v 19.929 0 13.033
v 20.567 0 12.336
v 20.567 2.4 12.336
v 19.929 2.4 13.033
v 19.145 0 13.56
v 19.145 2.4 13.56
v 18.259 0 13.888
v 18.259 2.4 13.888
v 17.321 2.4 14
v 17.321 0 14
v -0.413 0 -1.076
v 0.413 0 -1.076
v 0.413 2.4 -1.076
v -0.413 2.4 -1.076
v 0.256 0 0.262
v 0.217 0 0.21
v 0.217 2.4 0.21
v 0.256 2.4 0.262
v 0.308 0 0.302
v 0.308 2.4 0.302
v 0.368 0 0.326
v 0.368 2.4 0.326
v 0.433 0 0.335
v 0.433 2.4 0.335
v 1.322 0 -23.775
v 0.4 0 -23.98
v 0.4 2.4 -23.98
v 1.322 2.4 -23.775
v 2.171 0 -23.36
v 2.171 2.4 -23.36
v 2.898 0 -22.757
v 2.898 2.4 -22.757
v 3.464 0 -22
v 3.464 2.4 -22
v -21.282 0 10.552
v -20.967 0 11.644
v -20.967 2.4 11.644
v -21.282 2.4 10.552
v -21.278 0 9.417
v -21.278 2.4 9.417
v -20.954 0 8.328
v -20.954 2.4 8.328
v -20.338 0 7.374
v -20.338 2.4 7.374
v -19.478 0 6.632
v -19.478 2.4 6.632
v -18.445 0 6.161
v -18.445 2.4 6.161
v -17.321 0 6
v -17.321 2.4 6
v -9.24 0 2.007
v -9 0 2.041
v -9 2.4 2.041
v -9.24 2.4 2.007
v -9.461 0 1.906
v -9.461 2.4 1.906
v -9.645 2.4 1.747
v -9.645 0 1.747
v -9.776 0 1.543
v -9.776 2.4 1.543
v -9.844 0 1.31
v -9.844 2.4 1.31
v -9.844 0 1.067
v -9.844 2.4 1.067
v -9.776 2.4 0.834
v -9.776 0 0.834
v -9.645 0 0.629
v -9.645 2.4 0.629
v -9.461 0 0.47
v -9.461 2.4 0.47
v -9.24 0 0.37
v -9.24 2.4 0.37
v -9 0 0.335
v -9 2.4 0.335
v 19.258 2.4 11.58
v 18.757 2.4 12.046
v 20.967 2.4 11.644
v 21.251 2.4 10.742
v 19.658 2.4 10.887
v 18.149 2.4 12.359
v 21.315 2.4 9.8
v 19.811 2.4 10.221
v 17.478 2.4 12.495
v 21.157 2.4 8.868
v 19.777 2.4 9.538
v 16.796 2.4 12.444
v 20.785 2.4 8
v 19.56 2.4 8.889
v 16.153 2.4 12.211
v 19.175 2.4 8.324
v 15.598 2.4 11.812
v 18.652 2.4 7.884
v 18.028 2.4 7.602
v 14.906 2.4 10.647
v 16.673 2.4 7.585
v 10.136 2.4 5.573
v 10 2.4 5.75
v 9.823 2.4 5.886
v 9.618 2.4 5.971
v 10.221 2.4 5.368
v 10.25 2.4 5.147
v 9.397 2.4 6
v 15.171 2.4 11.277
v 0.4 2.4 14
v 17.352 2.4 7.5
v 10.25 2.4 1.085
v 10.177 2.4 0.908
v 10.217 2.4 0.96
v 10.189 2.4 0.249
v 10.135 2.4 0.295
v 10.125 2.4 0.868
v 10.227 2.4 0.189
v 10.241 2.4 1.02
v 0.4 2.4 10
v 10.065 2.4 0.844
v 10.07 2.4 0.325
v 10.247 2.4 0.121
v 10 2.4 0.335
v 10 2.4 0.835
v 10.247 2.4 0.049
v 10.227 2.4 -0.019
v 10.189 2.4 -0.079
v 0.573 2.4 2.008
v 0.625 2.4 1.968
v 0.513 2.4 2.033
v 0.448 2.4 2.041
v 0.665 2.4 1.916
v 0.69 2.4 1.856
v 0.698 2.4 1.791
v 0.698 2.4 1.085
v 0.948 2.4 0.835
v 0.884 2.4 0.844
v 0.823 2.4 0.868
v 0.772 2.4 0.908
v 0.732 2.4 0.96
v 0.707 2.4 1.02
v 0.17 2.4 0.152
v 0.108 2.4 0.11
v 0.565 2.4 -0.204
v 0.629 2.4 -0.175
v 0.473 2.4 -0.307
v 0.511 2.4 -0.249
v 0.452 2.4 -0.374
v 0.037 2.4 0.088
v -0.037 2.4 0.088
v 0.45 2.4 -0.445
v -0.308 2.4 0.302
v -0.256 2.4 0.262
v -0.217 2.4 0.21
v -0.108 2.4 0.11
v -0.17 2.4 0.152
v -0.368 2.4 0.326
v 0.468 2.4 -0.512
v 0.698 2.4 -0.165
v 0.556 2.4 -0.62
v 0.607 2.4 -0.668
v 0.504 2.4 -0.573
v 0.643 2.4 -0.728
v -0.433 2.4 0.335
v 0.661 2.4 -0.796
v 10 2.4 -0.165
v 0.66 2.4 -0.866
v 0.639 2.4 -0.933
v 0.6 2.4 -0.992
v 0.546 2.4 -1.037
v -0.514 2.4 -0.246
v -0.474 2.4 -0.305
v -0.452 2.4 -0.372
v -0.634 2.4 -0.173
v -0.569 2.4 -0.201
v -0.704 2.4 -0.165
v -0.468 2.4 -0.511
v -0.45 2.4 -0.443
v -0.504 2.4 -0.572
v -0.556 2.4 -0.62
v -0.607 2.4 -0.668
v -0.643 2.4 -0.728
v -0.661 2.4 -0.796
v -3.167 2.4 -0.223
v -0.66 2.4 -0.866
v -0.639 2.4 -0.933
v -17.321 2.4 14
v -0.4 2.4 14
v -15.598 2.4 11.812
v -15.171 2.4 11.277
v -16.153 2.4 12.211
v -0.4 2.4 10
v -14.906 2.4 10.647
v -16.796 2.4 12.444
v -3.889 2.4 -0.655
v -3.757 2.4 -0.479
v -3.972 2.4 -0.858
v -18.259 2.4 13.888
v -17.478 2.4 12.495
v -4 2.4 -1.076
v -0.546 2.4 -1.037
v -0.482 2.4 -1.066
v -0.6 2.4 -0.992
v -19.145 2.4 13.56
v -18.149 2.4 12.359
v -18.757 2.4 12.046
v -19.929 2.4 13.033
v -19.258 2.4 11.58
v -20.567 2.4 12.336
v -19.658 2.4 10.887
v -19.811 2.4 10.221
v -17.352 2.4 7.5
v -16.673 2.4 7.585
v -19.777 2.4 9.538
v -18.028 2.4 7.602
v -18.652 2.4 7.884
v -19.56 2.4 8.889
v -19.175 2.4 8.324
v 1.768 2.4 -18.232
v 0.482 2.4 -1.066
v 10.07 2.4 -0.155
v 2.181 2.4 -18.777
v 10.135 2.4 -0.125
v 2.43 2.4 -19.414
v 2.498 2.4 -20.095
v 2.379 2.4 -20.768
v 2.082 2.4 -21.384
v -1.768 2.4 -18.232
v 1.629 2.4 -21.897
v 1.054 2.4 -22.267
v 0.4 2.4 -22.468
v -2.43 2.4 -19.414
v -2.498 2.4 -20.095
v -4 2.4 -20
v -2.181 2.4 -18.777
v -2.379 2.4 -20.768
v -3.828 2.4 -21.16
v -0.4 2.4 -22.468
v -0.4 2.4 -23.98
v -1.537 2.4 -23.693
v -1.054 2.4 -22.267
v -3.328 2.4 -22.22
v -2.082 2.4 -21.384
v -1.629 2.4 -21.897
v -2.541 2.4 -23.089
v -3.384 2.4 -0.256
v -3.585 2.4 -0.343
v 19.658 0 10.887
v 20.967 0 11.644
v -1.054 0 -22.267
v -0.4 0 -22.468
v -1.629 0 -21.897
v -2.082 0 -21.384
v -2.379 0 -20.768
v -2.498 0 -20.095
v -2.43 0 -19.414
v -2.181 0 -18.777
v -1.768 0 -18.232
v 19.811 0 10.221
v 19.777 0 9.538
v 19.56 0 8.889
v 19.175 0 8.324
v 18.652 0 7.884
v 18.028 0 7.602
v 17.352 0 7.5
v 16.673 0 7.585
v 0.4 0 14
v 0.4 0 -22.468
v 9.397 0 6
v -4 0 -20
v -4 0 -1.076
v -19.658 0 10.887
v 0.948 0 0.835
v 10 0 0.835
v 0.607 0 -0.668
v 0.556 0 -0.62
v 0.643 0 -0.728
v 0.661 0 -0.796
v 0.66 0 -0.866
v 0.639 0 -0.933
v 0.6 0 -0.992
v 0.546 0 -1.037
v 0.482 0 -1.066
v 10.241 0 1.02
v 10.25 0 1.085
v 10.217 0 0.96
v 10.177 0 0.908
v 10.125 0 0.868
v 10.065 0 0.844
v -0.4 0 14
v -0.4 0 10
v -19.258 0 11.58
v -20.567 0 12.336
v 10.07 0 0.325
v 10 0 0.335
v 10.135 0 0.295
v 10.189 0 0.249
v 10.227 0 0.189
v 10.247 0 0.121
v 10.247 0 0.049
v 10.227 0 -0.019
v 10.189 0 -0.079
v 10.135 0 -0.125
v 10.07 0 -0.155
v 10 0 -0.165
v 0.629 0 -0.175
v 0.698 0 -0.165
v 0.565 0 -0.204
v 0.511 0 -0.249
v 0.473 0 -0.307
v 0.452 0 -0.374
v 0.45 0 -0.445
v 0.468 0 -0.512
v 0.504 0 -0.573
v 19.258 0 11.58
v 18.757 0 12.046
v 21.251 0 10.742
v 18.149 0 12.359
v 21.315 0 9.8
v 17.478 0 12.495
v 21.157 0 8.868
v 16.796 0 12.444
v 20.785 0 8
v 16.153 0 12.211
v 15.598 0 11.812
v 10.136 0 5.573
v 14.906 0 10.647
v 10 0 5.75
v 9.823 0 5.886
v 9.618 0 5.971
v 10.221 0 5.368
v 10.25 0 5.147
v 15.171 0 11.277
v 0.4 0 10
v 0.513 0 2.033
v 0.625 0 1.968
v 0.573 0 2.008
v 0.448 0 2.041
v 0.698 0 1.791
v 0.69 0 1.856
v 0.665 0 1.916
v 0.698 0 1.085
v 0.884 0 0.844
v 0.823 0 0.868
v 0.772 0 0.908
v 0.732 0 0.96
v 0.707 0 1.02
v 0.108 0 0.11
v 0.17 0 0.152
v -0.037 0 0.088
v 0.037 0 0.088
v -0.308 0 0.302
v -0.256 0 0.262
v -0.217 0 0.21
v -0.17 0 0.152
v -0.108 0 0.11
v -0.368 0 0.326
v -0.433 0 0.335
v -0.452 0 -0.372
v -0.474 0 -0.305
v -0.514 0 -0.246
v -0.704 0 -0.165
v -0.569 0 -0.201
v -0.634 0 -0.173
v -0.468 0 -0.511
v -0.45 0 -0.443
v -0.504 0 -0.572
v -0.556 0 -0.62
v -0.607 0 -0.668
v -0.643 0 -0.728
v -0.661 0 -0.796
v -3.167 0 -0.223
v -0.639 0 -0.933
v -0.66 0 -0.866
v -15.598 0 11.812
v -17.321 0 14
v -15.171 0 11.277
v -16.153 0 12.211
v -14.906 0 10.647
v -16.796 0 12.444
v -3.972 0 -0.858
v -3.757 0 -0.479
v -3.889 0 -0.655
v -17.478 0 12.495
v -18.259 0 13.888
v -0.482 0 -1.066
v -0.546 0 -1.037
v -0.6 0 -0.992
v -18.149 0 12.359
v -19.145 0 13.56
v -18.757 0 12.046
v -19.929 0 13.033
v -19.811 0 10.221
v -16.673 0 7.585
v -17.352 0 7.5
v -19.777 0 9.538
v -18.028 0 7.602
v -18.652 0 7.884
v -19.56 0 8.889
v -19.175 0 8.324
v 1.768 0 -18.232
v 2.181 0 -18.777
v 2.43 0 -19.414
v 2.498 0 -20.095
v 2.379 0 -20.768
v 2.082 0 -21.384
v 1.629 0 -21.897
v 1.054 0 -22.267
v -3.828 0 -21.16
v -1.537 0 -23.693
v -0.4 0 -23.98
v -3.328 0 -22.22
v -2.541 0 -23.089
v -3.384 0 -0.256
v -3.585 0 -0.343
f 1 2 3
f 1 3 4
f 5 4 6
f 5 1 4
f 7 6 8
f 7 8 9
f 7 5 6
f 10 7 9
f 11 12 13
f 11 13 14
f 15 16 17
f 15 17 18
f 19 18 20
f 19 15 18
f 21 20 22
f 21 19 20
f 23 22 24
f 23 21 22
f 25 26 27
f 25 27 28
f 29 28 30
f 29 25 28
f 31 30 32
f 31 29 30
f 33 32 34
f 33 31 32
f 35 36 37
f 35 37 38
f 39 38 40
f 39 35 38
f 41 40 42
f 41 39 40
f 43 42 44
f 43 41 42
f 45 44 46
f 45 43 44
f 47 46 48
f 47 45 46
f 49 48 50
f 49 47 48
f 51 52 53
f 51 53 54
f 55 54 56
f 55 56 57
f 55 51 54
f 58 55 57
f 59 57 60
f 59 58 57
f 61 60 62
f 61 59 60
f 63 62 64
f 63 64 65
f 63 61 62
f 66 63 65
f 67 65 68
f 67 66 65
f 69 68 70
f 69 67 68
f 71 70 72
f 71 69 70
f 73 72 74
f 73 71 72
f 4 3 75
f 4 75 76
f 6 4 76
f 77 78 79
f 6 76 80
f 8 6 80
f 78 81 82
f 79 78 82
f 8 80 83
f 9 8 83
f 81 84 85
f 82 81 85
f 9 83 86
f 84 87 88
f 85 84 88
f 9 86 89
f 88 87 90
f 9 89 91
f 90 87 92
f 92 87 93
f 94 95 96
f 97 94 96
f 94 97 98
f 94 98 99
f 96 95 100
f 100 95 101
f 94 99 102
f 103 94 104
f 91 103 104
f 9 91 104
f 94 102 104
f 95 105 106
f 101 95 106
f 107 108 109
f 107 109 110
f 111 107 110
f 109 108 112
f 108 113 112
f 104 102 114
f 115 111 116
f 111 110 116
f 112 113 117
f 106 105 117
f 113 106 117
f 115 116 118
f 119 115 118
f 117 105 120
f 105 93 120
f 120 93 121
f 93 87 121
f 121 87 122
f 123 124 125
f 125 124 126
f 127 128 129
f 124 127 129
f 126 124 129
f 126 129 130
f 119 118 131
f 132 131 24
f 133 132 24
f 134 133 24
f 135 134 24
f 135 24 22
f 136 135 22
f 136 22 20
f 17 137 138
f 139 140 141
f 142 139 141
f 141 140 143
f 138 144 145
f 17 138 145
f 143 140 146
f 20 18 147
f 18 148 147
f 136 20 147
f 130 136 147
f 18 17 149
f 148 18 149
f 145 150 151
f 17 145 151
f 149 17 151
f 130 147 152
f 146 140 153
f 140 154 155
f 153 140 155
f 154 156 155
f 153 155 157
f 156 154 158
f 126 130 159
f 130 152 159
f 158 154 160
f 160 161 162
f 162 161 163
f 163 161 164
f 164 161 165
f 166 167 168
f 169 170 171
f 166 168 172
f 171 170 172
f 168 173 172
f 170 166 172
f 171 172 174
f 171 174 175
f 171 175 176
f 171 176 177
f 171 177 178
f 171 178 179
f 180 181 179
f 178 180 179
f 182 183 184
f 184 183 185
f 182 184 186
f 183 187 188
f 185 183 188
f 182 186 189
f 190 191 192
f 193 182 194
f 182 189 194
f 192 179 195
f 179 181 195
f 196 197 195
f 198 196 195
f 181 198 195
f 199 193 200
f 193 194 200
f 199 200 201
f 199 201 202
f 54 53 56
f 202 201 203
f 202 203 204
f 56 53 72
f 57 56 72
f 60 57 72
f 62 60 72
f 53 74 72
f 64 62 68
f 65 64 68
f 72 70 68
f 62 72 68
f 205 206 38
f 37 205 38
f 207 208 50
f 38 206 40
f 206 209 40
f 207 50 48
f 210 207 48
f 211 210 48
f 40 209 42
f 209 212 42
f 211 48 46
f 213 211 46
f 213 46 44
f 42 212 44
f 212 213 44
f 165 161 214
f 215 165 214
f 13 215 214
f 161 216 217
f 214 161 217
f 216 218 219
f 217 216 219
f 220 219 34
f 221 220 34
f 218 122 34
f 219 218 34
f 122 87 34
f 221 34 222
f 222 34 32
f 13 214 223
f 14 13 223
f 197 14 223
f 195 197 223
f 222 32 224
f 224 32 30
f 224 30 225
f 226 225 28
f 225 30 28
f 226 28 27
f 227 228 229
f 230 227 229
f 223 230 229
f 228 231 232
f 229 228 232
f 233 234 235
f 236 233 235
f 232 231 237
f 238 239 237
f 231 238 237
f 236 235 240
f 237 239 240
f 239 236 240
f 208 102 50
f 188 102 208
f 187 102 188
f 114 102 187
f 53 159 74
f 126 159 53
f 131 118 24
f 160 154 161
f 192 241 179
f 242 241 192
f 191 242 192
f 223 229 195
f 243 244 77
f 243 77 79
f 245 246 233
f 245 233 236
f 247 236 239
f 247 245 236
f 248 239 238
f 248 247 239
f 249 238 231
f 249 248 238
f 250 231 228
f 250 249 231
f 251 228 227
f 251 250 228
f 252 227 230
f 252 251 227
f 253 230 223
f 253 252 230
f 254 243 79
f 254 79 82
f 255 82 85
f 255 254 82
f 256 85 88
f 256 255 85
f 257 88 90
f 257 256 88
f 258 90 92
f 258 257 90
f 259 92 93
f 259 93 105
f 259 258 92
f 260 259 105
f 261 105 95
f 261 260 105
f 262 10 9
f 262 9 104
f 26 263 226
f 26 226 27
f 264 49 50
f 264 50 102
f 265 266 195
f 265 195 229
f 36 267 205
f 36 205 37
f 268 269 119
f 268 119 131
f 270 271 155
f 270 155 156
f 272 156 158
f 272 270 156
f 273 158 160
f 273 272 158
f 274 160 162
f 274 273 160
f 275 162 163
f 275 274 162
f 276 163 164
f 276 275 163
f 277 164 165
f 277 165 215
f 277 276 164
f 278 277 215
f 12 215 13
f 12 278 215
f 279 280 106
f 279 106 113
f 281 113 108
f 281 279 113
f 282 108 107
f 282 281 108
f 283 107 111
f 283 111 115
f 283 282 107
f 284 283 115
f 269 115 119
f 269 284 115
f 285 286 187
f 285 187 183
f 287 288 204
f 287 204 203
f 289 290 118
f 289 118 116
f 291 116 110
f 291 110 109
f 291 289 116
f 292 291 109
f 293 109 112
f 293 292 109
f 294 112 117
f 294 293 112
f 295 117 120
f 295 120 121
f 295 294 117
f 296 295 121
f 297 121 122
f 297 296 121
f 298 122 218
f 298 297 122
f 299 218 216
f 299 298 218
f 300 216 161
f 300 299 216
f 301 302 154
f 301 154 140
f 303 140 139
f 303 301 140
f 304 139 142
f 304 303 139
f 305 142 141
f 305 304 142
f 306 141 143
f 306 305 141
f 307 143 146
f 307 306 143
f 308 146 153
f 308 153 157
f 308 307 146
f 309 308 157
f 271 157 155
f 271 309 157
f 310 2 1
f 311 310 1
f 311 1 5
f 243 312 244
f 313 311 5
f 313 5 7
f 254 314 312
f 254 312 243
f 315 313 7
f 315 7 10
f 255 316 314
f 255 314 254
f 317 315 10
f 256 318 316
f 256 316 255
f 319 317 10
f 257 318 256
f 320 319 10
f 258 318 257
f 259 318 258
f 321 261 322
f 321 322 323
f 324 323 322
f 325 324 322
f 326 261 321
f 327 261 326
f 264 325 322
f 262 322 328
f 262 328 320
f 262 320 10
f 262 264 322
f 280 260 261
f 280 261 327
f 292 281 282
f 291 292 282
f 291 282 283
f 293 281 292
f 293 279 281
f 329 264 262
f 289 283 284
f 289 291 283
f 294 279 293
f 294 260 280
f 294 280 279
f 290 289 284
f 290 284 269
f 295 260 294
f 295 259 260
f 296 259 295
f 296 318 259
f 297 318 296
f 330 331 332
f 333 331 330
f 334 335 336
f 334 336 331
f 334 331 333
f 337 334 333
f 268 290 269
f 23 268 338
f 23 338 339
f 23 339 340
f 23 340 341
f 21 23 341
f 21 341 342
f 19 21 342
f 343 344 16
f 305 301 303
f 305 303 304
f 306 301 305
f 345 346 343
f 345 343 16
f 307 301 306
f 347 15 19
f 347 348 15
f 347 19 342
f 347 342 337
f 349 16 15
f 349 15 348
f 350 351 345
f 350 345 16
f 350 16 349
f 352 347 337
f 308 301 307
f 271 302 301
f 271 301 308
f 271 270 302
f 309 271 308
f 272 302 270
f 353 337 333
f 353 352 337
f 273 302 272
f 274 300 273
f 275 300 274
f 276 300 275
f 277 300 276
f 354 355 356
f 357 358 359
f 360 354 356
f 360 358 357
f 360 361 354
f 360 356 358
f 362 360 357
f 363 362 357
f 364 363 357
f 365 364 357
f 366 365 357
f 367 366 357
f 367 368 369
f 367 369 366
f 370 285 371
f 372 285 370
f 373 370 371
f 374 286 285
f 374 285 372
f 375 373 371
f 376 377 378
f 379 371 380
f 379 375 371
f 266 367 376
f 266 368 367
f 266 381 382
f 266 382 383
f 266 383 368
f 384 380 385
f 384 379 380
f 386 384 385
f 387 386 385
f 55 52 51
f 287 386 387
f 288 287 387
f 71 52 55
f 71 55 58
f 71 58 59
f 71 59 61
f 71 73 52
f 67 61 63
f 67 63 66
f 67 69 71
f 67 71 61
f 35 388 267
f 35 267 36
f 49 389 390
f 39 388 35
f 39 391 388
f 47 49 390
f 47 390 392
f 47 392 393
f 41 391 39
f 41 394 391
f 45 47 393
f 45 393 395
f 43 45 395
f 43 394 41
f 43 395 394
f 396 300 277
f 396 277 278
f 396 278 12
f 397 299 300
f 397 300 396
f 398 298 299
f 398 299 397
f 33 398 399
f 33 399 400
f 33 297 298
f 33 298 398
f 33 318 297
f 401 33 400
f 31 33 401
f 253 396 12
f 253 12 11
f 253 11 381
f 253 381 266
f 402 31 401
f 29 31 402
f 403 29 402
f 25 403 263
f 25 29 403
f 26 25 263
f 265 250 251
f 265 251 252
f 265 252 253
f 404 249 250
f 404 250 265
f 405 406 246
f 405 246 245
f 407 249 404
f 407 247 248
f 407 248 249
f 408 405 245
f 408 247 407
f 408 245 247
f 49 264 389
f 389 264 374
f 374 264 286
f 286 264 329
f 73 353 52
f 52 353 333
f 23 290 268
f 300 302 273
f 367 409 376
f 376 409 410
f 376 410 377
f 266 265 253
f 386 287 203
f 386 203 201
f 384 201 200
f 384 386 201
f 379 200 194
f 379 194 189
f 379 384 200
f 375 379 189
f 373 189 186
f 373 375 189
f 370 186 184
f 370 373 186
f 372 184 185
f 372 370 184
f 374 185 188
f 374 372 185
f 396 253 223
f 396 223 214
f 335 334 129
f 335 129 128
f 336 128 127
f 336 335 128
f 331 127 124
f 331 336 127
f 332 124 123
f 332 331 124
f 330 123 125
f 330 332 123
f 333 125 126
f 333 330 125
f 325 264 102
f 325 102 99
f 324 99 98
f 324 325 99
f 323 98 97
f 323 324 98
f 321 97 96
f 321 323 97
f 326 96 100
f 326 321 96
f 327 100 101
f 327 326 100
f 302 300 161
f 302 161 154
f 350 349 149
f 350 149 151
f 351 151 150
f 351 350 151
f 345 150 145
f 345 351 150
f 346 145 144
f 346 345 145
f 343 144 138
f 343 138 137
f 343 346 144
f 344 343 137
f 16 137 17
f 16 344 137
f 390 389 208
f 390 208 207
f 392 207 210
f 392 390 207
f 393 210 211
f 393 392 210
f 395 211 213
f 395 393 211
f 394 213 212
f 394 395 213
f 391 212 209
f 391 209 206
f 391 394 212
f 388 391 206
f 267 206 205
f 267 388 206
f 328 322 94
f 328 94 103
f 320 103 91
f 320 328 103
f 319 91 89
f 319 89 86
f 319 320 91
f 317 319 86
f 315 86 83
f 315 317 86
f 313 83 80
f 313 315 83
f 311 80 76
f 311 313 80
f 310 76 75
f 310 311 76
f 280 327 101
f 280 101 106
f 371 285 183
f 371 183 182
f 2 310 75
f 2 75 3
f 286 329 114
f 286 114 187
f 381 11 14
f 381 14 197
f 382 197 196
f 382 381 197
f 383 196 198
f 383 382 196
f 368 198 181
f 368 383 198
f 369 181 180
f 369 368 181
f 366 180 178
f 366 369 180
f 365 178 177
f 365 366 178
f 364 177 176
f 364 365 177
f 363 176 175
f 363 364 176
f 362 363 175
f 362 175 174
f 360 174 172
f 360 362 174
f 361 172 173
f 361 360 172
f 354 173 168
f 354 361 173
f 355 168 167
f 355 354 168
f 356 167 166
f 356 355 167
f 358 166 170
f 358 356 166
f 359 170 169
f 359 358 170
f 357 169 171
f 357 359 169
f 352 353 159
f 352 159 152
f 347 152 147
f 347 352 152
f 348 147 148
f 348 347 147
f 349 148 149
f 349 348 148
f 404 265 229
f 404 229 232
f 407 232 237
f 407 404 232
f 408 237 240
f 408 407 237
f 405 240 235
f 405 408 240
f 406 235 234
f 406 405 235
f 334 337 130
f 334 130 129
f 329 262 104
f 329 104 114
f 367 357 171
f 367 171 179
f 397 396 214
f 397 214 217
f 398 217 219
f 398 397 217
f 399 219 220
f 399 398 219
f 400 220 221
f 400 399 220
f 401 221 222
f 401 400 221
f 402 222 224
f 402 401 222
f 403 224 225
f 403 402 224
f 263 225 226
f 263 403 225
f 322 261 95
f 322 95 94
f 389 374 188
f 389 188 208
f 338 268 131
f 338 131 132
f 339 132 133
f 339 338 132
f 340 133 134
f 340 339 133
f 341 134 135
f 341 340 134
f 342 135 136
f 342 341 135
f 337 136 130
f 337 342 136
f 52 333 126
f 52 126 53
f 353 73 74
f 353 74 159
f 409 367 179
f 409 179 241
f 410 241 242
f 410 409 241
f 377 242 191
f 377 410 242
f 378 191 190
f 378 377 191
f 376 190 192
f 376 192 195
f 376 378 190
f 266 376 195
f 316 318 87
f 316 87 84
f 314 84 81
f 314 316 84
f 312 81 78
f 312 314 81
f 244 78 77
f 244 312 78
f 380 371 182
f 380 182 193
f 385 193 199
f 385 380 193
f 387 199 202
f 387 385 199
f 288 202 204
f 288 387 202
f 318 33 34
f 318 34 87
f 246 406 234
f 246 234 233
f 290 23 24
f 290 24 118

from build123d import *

# Parameters (mm, degrees)
BOSS_EXTRUDE1_DEPTH = 2.4


with BuildPart() as part:
    # Sketch1 → Boss-Extrude1 (new body)
    with BuildSketch(Plane(origin=(0, 0, 0), x_dir=(1, 0, 0), z_dir=(0, 1, 0))):
        with BuildLine():
            Line((-1.767766953, 18.232233047), (1.767766953, 18.232233047))
            ThreePointArc((1.767766953, 18.232233047), (2.379032248, 20.768248374), (0.4, 22.467792536))
            Line((0.4, 22.467792536), (0.4, 23.979949748))
            ThreePointArc((0.4, 23.979949748), (2.170914686, 23.359632335), (3.464101615, 22))
            Line((3.464101615, 22), (20.784609691, -8))
            ThreePointArc((20.784609691, -8), (21.315492368, -9.7997489), (20.967245664, -11.643564713))
            Line((20.967245664, -11.643564713), (19.657679103, -10.887486106))
            ThreePointArc((19.657679103, -10.887486106), (19.175346808, -8.323821824), (16.673460463, -7.585185434))
            Line((16.673460463, -7.585185434), (14.90569351, -10.647047613))
            ThreePointArc((14.90569351, -10.647047613), (16.79631456, -12.44442655), (19.257679103, -11.580306429))
            Line((19.257679103, -11.580306429), (20.567245664, -12.336385036))
            ThreePointArc((20.567245664, -12.336385036), (19.144577682, -13.559883435), (17.320508076, -14))
            Line((17.320508076, -14), (0.4, -14))
            Line((0.4, -14), (0.4, -10))
            Line((0.4, -10), (-0.4, -10))
            Line((-0.4, -10), (-0.4, -14))
            Line((-0.4, -14), (-17.320508076, -14))
            ThreePointArc((-17.320508076, -14), (-19.144577682, -13.559883435), (-20.567245664, -12.336385036))
            Line((-20.567245664, -12.336385036), (-19.257679103, -11.580306429))
            ThreePointArc((-19.257679103, -11.580306429), (-16.79631456, -12.44442655), (-14.90569351, -10.647047613))
            Line((-14.90569351, -10.647047613), (-16.673460463, -7.585185434))
            ThreePointArc((-16.673460463, -7.585185434), (-19.175346808, -8.323821824), (-19.657679103, -10.887486106))
            Line((-19.657679103, -10.887486106), (-20.967245664, -11.643564713))
            ThreePointArc((-20.967245664, -11.643564713), (-20.680140411, -7.829085314), (-17.320508076, -6))
            Line((-17.320508076, -6), (9.396838839, -6))
            ThreePointArc((9.396838839, -6), (10.000114881, -5.750114881), (10.25, -5.146838839))
            Line((10.25, -5.146838839), (10.25, -1.085))
            ThreePointArc((10.25, -1.085), (10.176776695, -0.908223305), (10, -0.835))
            Line((10, -0.835), (0.94831677, -0.835))
            ThreePointArc((0.94831677, -0.835), (0.771540074, -0.908223305), (0.69831677, -1.085))
            Line((0.69831677, -1.085), (0.69831677, -1.791322322))
            ThreePointArc((0.69831677, -1.791322322), (0.625093465, -1.968099017), (0.44831677, -2.041322322))
            Line((0.44831677, -2.041322322), (-9, -2.041322322))
            ThreePointArc((-9, -2.041322322), (-9.853161161, -1.188161161), (-9, -0.335))
            Line((-9, -0.335), (-0.433012702, -0.335))
            ThreePointArc((-0.433012702, -0.335), (-0.308012702, -0.301506351), (-0.216506351, -0.21))
            ThreePointArc((-0.216506351, -0.21), (0, -0.085), (0.216506351, -0.21))
            ThreePointArc((0.216506351, -0.21), (0.308012702, -0.301506351), (0.433012702, -0.335))
            Line((0.433012702, -0.335), (10, -0.335))
            ThreePointArc((10, -0.335), (10.25, -0.085), (10, 0.165))
            Line((10, 0.165), (0.69831677, 0.165))
            ThreePointArc((0.69831677, 0.165), (0.459762847, 0.340220149), (0.555604555, 0.620263791))
            ThreePointArc((0.555604555, 0.620263791), (0.651446263, 0.900307433), (0.412892341, 1.075527582))
            Line((0.412892341, 1.075527582), (-0.412892341, 1.075527582))
            ThreePointArc((-0.412892341, 1.075527582), (-0.651446263, 0.900307433), (-0.555604555, 0.620263791))
            ThreePointArc((-0.555604555, 0.620263791), (-0.460652433, 0.337439296), (-0.704155623, 0.165068194))
            Line((-0.704155623, 0.165068194), (-3.166764771, 0.222599142))
            ThreePointArc((-3.166764771, 0.222599142), (-3.757119102, 0.479338042), (-4, 1.075527582))
            Line((-4, 1.075527582), (-4, 20))
            ThreePointArc((-4, 20), (-2.966479395, 22.683281573), (-0.4, 23.979949748))
            Line((-0.4, 23.979949748), (-0.4, 22.467792536))
            ThreePointArc((-0.4, 22.467792536), (-2.379032248, 20.768248374), (-1.767766953, 18.232233047))
        make_face()
    extrude(amount=BOSS_EXTRUDE1_DEPTH)


solid = part.part
